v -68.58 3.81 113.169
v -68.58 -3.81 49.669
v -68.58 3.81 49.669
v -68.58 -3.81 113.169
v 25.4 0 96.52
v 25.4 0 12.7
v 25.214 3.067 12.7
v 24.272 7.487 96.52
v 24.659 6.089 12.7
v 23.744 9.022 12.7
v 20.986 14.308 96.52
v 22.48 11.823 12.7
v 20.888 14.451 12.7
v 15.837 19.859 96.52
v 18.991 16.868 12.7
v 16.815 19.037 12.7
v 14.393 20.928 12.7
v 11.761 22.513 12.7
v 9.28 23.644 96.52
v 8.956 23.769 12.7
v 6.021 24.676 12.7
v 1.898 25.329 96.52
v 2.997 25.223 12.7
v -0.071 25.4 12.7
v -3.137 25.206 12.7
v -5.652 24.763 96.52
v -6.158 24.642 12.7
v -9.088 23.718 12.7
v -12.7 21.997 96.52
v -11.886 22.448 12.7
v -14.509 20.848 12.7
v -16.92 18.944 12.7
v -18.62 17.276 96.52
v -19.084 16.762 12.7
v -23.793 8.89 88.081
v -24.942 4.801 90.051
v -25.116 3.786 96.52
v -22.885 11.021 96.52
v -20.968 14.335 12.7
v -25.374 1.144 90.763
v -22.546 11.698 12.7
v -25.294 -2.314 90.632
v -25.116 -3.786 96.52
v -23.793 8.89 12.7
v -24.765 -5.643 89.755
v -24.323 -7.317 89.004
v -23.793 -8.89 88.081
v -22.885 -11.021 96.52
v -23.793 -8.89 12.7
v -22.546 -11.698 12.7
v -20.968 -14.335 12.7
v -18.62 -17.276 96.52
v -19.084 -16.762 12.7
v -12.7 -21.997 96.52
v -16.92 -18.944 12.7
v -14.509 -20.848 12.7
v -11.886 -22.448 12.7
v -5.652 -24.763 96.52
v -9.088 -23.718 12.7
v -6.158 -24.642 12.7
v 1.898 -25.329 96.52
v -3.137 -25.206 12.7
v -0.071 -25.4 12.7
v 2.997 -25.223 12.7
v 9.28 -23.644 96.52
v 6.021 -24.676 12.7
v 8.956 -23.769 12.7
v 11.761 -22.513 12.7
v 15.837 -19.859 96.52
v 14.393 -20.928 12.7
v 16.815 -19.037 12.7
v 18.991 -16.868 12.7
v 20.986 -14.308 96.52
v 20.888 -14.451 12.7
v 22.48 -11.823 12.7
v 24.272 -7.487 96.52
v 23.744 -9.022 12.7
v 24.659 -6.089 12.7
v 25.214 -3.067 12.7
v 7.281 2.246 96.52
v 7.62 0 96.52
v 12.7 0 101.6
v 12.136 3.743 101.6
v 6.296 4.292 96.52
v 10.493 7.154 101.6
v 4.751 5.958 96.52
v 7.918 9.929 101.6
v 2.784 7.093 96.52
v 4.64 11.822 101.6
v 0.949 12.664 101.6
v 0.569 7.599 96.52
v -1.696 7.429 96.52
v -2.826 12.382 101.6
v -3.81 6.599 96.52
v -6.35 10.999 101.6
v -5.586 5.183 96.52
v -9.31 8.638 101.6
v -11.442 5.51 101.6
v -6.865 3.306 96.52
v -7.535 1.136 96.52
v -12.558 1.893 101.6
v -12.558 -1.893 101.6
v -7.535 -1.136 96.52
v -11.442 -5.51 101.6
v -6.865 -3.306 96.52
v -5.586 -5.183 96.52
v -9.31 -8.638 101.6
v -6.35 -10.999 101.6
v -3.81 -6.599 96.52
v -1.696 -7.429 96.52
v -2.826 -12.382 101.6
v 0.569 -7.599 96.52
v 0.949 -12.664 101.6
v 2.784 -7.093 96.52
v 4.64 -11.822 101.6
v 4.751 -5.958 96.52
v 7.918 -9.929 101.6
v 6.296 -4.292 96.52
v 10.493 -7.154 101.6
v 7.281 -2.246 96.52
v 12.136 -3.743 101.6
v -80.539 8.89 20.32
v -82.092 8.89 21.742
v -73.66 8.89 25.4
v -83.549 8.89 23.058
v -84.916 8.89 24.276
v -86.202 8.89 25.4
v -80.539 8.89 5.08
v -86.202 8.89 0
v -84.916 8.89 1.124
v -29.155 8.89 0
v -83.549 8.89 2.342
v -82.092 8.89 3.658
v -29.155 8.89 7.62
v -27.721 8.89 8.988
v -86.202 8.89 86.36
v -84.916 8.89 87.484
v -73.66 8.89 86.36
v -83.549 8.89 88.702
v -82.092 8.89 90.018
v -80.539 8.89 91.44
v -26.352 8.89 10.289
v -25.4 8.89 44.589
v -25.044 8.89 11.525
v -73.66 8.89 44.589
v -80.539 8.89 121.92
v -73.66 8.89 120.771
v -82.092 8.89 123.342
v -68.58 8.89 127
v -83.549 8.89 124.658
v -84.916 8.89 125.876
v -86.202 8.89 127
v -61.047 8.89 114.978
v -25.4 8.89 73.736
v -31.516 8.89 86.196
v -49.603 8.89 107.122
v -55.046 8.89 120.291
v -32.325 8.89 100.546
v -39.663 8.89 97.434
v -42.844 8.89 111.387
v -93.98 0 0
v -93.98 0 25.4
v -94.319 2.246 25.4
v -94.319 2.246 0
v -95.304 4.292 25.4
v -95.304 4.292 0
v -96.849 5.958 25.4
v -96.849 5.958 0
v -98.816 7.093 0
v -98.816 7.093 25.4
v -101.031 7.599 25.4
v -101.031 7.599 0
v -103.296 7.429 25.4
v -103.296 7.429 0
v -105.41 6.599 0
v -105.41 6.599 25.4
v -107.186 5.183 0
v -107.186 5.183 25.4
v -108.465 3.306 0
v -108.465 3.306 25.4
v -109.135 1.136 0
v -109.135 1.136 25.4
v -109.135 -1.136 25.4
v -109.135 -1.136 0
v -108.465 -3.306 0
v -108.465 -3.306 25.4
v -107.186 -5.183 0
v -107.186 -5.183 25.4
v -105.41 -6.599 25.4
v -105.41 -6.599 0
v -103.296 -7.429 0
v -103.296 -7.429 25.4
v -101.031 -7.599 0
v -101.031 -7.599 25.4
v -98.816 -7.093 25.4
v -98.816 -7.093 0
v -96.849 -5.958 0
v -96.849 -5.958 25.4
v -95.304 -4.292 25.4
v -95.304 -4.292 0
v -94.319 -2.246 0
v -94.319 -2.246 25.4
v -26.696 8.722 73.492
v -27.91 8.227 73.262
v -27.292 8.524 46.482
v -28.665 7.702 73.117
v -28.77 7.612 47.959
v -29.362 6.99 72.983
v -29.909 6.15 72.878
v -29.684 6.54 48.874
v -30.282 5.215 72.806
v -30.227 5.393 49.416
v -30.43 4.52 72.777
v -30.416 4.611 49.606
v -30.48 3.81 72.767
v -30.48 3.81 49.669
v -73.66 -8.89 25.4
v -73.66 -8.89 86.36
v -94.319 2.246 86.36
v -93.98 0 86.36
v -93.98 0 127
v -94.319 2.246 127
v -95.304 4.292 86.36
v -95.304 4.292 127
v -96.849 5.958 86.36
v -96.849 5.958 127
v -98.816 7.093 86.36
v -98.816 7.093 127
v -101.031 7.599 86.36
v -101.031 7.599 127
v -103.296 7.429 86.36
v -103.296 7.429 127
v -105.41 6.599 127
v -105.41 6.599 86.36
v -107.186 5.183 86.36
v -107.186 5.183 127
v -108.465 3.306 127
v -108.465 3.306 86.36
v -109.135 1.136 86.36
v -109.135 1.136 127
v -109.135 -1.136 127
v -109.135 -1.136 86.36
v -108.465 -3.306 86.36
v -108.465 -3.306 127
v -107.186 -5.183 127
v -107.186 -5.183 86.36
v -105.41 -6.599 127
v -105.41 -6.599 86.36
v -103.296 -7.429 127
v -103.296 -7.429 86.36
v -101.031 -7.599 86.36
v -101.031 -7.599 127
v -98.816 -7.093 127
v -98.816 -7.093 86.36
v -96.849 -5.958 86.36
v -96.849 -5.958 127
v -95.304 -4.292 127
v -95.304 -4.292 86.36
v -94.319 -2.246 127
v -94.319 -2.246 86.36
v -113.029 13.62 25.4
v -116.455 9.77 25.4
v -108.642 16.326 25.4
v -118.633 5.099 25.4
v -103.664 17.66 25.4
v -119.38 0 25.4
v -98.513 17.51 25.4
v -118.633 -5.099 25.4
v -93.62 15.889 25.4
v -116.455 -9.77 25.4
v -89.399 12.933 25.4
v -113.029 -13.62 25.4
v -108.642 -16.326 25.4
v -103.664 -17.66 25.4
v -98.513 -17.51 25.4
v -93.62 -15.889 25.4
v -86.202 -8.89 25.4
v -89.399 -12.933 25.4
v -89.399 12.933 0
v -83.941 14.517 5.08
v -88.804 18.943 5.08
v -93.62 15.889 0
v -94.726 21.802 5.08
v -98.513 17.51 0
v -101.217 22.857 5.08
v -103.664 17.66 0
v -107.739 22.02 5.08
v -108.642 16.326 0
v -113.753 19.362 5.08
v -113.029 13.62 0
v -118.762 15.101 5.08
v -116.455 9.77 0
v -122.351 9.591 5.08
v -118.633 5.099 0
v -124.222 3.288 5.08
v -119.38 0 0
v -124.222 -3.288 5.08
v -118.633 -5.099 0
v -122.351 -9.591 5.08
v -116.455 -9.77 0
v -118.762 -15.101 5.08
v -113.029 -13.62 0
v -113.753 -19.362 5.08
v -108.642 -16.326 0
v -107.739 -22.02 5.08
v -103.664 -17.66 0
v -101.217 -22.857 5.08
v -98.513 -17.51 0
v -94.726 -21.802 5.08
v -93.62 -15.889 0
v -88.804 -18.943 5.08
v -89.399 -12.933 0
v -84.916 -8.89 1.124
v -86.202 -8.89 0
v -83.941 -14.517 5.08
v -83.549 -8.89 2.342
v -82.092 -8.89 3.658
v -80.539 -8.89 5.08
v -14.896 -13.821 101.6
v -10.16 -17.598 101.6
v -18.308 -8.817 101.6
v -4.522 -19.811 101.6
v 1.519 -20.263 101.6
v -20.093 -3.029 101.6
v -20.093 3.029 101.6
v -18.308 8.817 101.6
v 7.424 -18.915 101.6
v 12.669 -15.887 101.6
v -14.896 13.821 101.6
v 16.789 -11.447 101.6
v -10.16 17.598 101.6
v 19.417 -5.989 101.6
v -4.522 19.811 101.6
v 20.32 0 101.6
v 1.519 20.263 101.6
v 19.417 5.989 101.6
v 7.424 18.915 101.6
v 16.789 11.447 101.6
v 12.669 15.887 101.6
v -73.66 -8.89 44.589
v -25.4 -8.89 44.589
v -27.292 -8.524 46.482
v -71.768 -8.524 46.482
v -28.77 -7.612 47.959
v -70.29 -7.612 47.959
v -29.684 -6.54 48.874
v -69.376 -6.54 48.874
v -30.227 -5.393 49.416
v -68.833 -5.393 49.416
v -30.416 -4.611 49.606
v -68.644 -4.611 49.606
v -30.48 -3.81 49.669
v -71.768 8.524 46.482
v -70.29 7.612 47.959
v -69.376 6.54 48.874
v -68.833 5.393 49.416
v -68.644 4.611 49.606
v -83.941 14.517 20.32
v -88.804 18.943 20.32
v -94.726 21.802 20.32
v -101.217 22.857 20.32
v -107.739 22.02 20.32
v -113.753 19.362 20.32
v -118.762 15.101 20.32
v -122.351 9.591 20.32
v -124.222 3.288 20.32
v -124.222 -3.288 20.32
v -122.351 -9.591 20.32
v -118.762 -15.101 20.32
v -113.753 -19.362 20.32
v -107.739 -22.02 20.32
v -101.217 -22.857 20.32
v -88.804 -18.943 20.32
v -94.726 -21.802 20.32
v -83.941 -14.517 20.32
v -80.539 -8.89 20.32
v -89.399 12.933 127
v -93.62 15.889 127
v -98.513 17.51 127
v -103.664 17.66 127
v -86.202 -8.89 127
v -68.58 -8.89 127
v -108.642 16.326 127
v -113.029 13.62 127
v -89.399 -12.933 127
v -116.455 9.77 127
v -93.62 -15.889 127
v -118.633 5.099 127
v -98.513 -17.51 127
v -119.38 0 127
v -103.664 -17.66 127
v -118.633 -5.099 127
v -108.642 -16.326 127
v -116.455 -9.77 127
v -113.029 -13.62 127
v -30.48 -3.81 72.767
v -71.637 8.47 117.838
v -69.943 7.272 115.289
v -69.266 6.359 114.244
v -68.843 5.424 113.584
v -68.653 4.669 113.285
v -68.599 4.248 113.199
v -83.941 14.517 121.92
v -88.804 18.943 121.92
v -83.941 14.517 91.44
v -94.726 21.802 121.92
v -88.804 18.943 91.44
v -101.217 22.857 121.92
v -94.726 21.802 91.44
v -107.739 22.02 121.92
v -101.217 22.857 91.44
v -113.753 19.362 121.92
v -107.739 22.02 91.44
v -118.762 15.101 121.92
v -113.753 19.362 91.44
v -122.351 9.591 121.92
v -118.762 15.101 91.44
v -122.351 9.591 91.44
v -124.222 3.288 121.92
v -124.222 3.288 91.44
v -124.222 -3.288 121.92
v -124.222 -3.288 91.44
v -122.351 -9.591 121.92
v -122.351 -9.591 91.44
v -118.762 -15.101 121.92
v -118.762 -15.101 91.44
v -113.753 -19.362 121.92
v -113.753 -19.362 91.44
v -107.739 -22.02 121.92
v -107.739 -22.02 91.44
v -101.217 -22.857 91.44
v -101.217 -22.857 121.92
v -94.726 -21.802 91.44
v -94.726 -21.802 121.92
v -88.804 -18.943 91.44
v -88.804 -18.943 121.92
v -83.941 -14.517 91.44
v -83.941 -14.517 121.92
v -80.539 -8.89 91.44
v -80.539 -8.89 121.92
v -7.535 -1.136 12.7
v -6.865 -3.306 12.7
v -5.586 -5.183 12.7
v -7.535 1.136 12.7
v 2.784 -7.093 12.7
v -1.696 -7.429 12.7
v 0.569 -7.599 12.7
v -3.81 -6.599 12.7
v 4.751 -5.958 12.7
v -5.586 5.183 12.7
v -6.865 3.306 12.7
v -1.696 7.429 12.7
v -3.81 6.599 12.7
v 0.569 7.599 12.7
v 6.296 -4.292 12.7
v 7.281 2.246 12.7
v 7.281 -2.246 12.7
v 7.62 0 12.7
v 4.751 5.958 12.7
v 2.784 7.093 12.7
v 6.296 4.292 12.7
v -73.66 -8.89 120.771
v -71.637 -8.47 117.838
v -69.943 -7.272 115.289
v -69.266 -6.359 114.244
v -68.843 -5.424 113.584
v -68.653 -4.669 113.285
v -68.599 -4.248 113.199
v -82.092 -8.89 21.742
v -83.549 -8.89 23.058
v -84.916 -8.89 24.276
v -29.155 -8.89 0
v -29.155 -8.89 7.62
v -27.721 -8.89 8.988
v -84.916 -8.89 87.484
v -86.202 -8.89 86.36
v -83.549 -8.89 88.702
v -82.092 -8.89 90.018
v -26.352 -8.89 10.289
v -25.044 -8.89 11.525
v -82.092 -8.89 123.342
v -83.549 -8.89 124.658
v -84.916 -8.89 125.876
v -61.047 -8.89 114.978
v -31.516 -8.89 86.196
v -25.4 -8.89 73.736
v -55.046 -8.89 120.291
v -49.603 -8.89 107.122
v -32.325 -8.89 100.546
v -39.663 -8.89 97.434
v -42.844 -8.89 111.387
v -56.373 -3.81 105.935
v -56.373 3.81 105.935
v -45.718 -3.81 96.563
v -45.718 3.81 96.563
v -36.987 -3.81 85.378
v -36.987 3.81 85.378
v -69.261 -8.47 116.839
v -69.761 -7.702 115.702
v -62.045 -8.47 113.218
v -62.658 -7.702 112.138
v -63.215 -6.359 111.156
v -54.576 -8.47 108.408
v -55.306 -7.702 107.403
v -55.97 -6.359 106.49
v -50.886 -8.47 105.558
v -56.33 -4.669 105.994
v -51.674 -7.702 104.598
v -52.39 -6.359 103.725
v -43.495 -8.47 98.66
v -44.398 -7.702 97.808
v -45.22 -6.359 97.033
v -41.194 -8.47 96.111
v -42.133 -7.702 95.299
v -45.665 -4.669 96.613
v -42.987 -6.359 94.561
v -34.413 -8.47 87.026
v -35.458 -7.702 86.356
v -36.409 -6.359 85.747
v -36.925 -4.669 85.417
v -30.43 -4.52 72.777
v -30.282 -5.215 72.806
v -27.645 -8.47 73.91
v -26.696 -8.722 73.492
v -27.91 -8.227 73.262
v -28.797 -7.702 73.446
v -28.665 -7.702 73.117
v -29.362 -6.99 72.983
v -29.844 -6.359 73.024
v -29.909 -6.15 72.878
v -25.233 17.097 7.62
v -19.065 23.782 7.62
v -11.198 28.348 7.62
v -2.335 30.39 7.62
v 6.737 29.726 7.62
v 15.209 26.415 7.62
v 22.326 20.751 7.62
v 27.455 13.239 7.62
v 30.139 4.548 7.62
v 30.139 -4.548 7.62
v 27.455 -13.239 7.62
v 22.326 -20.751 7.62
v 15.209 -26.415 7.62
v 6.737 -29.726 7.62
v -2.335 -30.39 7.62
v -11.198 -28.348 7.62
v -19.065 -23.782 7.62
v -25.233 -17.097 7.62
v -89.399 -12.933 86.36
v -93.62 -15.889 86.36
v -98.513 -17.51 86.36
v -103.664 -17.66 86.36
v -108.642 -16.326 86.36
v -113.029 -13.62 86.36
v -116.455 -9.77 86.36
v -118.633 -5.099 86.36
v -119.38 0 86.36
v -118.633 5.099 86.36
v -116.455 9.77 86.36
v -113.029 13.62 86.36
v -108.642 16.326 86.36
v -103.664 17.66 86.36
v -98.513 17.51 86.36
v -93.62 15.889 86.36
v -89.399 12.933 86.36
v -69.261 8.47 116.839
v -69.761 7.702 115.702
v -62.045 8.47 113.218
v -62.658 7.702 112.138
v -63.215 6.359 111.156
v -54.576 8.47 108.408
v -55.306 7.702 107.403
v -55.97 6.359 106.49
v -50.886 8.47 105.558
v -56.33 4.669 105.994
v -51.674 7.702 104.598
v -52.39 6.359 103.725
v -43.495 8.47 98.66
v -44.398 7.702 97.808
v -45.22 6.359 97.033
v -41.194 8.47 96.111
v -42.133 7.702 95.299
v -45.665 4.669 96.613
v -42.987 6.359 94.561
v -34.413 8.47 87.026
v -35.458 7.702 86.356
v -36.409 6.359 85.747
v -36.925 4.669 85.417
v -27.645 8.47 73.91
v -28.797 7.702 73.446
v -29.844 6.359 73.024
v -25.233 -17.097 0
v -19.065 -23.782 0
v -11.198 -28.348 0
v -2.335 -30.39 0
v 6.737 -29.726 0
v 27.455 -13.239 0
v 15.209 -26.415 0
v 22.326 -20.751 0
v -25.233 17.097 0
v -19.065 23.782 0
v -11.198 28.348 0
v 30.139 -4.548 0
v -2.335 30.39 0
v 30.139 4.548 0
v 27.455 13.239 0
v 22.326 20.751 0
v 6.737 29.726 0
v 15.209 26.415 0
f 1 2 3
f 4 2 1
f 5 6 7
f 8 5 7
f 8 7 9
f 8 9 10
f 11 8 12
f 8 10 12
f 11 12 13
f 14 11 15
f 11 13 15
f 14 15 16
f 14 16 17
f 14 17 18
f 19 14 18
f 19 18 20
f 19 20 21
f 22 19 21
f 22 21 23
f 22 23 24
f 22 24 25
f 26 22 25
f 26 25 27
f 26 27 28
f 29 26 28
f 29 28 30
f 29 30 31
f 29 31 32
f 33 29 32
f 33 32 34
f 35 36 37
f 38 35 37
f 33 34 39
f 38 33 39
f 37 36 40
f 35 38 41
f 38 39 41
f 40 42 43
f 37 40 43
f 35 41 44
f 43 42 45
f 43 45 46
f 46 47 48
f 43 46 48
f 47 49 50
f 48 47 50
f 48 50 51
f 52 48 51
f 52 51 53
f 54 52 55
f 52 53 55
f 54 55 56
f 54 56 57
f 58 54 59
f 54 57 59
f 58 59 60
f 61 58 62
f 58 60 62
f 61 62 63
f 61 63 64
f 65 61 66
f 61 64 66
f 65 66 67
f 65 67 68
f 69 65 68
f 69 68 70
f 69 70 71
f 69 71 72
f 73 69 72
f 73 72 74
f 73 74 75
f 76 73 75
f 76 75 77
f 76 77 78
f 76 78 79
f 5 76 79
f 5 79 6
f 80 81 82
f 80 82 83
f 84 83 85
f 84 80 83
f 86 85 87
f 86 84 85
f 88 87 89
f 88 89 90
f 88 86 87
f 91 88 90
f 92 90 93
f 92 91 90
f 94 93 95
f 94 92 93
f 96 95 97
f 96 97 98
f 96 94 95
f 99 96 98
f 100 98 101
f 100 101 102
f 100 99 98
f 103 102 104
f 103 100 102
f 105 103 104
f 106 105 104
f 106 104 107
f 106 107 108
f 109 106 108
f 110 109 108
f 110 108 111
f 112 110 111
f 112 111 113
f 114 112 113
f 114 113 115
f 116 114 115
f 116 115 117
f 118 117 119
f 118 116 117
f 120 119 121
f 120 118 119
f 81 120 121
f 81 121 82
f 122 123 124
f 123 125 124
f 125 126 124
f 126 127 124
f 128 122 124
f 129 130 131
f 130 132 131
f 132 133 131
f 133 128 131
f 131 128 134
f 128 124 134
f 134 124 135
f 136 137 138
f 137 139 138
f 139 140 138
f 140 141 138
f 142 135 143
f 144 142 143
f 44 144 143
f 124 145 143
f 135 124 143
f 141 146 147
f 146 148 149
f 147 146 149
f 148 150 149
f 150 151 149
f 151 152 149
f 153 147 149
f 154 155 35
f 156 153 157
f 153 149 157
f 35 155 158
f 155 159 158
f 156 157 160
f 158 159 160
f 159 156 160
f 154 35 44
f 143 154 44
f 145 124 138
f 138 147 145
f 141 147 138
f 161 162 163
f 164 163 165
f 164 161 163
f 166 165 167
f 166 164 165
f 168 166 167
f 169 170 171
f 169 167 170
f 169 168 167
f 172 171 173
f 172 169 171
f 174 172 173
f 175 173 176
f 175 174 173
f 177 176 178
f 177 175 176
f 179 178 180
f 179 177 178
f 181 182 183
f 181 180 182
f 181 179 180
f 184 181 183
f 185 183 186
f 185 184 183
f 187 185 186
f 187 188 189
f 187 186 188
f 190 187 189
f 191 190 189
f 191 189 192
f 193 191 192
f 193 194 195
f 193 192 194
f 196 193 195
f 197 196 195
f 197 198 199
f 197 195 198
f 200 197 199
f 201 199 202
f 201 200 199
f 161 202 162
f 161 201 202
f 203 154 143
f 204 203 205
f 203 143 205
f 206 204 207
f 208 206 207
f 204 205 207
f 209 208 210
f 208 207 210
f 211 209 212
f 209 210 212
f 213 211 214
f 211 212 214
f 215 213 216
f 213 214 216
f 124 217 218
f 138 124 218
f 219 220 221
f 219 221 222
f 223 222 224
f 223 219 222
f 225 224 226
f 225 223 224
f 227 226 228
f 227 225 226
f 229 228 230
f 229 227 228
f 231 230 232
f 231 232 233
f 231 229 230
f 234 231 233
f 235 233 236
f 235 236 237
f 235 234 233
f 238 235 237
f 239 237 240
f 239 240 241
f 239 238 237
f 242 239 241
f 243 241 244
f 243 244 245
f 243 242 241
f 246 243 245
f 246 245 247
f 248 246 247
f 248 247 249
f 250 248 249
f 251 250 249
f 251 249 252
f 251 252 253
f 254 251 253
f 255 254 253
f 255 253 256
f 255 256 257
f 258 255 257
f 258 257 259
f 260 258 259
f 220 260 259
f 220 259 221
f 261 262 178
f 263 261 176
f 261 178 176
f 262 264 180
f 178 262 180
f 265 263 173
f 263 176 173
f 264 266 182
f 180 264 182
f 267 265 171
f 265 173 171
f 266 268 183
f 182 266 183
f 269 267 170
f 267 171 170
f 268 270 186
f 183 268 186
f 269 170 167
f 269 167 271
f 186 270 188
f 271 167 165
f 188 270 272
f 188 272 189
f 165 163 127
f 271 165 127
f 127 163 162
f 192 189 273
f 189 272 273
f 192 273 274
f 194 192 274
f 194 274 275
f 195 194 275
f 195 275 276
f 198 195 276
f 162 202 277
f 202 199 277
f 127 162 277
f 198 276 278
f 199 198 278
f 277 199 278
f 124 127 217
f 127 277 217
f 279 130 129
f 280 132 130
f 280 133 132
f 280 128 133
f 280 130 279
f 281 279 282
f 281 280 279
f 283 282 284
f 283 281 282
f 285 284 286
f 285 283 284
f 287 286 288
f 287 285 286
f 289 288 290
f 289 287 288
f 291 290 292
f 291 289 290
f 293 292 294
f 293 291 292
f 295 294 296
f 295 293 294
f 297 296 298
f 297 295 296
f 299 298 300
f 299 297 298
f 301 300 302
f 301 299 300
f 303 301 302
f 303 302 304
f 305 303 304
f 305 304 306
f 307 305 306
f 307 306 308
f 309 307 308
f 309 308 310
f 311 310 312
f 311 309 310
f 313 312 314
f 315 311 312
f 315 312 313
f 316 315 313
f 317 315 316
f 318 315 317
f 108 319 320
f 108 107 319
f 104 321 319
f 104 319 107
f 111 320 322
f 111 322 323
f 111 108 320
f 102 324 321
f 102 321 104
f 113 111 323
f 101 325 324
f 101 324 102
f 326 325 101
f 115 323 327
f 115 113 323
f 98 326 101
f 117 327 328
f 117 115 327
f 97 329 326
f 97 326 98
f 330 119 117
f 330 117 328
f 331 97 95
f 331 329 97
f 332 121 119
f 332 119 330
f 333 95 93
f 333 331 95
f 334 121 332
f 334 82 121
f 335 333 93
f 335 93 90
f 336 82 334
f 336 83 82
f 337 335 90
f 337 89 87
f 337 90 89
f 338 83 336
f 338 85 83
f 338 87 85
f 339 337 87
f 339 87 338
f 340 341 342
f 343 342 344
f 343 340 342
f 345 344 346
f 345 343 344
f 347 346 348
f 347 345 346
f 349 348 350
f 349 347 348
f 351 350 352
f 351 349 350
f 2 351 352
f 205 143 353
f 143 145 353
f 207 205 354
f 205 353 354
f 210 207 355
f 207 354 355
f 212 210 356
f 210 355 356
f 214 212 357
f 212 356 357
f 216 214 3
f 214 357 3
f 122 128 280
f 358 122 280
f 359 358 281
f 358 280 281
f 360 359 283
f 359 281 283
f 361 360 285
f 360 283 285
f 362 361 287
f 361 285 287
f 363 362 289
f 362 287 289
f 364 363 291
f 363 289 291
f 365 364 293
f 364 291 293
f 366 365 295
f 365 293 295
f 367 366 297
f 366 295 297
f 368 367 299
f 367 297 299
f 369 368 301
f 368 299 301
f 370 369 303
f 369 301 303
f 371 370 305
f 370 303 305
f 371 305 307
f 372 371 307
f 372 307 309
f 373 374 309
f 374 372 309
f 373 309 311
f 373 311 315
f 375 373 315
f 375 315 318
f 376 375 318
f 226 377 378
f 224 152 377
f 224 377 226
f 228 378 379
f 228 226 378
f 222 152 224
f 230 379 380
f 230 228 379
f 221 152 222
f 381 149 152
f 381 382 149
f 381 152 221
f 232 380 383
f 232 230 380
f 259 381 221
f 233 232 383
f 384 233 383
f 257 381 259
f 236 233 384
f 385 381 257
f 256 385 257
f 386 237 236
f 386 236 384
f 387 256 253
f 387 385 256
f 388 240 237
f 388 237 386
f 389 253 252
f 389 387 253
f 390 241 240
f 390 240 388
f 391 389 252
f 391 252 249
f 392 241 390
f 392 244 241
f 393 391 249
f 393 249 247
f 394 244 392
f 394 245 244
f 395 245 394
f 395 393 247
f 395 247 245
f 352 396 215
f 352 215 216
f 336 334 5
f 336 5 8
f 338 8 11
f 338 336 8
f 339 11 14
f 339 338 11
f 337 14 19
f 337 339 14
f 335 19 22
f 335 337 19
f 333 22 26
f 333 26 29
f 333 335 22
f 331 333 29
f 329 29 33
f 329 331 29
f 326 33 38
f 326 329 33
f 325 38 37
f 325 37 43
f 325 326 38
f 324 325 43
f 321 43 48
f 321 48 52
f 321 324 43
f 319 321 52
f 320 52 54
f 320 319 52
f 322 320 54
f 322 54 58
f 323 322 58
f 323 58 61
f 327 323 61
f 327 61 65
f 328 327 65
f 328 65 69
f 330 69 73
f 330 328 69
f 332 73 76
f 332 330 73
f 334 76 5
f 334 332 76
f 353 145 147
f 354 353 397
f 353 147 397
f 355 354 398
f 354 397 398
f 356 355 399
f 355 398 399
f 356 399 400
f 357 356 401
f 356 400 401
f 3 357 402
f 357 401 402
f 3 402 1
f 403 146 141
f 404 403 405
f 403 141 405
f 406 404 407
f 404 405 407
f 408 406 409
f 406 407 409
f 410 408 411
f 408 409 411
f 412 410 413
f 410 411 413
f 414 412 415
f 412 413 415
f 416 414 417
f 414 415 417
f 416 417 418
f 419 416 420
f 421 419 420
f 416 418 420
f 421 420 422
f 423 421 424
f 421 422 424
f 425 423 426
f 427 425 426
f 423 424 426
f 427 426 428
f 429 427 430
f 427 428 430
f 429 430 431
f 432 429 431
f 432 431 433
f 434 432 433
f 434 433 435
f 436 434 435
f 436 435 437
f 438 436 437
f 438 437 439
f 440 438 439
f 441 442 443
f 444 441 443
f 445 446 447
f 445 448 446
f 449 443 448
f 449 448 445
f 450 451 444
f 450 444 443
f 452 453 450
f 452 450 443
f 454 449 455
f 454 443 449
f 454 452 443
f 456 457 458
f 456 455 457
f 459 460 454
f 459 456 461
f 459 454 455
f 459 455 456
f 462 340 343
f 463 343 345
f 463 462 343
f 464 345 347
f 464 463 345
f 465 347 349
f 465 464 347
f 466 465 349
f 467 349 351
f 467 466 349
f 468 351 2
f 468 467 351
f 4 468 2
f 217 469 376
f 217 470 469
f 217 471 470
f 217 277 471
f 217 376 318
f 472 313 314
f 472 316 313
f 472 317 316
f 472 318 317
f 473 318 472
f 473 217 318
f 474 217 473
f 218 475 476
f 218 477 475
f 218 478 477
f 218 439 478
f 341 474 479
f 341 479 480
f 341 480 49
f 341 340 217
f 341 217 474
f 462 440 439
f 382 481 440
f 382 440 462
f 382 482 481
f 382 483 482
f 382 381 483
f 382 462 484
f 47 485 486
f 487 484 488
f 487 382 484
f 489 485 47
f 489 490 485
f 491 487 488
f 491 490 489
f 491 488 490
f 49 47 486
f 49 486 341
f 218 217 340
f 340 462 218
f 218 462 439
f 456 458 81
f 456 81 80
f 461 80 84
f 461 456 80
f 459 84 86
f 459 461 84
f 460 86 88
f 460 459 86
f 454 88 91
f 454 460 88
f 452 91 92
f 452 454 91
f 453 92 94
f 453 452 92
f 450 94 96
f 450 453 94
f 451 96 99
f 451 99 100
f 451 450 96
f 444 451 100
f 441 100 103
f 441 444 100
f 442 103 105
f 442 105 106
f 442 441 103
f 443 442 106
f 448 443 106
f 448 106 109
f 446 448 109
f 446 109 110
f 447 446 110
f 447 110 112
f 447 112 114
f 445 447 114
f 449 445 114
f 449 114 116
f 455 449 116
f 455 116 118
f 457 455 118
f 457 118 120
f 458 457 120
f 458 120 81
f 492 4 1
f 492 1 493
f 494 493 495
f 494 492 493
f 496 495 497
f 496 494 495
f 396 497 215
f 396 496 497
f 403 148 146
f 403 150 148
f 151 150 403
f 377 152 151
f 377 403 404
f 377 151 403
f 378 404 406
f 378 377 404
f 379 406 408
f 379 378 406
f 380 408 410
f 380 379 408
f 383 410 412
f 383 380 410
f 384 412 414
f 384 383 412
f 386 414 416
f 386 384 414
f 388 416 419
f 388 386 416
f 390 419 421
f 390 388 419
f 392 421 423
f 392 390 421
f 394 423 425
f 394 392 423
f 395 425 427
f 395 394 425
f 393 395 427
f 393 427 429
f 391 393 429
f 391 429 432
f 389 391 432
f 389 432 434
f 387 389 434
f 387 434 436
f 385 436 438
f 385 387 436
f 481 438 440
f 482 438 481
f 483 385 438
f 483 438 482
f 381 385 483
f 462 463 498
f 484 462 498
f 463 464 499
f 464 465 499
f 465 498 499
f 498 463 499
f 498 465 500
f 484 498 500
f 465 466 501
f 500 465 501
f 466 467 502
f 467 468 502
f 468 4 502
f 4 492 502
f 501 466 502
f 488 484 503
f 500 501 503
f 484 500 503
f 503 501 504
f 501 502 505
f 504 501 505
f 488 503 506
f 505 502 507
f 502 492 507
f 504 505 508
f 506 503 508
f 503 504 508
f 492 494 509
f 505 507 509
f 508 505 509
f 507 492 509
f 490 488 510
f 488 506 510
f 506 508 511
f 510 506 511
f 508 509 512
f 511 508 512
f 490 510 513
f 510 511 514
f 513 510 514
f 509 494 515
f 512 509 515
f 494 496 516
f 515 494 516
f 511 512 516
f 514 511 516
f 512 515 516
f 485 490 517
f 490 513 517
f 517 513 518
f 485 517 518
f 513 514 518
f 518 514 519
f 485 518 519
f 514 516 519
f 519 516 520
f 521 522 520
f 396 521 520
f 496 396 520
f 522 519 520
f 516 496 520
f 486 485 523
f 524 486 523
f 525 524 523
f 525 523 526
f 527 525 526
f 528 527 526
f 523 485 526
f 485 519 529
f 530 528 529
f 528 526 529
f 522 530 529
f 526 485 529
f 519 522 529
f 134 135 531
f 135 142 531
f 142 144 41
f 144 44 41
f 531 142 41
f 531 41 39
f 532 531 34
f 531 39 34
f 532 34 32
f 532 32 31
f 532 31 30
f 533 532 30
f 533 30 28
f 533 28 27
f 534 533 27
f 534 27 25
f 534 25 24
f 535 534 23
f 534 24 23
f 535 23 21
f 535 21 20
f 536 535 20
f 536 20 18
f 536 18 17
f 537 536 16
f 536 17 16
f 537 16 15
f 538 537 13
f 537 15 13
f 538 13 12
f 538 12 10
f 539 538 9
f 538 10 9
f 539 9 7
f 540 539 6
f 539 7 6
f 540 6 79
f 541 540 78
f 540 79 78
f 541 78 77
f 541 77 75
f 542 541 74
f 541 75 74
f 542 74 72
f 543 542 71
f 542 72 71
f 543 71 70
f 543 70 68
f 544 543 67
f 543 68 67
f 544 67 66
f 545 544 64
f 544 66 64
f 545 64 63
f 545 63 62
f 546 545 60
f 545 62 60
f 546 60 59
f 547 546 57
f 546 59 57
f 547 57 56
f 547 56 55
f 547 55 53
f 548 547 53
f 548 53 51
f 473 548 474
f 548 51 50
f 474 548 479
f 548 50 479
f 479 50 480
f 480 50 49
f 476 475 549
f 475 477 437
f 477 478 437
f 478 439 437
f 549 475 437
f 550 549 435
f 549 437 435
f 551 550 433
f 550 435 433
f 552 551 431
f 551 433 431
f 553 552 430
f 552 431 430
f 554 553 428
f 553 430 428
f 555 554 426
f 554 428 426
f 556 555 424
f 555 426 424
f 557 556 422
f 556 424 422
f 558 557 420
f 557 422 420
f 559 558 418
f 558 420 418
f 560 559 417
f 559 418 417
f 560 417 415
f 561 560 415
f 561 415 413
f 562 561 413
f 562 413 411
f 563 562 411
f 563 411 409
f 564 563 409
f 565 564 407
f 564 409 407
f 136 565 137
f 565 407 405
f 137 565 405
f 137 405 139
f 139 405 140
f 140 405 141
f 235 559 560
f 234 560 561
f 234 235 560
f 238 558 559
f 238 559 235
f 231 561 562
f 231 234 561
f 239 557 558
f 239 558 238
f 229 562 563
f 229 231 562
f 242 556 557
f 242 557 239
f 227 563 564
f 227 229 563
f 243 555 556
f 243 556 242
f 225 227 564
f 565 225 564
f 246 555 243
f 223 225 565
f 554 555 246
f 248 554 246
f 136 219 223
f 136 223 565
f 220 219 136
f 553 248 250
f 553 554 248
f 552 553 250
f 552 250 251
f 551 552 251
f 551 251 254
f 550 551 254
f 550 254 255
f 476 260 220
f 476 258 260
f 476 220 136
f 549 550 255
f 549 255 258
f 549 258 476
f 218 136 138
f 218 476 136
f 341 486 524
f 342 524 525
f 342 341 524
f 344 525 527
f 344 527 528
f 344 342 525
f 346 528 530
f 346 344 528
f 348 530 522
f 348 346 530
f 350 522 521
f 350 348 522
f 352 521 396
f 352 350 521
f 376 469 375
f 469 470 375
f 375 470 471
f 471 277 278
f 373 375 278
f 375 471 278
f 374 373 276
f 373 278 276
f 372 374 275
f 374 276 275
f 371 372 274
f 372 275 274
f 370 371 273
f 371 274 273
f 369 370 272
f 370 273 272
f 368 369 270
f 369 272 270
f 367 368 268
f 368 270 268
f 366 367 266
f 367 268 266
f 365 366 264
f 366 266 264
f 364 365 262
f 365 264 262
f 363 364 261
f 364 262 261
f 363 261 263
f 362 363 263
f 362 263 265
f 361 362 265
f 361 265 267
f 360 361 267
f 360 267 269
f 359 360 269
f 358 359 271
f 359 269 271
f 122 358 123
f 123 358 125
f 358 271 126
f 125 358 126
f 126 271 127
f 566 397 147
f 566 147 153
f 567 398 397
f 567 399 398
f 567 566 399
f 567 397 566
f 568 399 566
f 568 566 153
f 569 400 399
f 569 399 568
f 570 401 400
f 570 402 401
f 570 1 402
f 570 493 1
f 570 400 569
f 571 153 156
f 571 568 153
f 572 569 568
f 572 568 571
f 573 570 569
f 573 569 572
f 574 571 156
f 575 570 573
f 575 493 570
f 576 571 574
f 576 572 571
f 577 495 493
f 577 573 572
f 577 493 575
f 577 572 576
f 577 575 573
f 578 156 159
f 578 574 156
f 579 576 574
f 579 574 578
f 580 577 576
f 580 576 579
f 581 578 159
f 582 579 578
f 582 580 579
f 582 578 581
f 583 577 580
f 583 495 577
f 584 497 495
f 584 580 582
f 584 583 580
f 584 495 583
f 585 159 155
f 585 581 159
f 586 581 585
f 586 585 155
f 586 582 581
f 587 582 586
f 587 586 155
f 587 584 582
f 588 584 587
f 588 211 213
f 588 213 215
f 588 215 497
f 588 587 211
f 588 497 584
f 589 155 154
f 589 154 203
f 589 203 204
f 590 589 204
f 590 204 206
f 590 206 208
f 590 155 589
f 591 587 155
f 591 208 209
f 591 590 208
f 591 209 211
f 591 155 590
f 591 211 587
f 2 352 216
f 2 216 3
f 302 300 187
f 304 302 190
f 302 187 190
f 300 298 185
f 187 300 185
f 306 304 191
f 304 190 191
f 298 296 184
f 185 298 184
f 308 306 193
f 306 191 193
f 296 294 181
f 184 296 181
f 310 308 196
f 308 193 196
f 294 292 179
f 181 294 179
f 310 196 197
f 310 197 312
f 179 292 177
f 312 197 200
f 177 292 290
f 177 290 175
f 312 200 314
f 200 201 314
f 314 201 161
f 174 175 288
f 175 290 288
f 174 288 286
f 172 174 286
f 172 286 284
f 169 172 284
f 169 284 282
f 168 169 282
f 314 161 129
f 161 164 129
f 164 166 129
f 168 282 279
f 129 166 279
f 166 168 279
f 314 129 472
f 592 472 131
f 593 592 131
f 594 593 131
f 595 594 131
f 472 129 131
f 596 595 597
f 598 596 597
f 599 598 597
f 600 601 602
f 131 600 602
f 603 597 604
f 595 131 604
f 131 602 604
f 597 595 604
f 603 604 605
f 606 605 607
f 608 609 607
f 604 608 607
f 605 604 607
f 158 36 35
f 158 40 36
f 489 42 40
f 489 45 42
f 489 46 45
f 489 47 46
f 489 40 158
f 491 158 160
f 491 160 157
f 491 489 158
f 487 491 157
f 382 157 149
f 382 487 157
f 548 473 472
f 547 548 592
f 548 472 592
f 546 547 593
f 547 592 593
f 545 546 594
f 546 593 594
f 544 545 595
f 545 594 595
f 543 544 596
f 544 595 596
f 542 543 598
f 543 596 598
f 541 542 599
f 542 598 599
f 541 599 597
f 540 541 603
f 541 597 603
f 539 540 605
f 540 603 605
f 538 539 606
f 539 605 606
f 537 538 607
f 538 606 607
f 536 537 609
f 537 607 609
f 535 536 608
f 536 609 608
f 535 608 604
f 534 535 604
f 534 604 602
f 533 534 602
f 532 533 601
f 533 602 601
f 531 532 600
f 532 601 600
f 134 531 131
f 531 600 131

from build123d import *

# Parameters (mm, degrees)
F0_R      = 22.86
F0_R_2    = 7.62
F1_DEPTH  = 127
F0_R_3    = 25.4
F2_DEPTH  = 101.6
F4_DEPTH  = 8.89
F5_W      = 60.96
F5_H      = 60.96
F6_DEPTH  = 50.8
F7_R      = 5.07999
F8_SIZE   = 5.08
F9_R      = 30.48
F10_DEPTH = 12.7
F11_SIZE  = 5.07999


# Not quite as in the source:
# - a fillet or chamfer is up to 0.001 mm smaller than in the source, because OpenCascade refuses the exact size


with BuildPart() as f1:
    # F0 (on Top) → F1 (new body)
    with BuildSketch(Plane.XY):
        with Locations((-101.6, 0)):
            Circle(F0_R)
        with Locations((-101.6, 0)):
            Circle(F0_R_2, mode=Mode.SUBTRACT)
    extrude(amount=F1_DEPTH)



with BuildPart() as f2:
    # F0 (on Top) → F2 (new body)
    with BuildSketch(Plane.XY):
        Circle(F0_R_3)
        Circle(F0_R_2, mode=Mode.SUBTRACT)
    extrude(amount=F2_DEPTH)


with BuildPart() as f1_1:
    add(f1.part)

    add(f2.part)  # F4 merges F2
    # F3 (on Front) → F4 (join, symmetric)
    with BuildSketch(Plane.XZ):
        with BuildLine():
            Line((-81.28, 127), (-81.28, 0))
            Line((-81.28, 0), (-20.32, 0))
            Line((-20.32, 0), (-20.32, 81.28))
            ThreePointArc((-20.32, 81.28), (-40.0155943211, 108.82076155), (-68.58, 127))
            Line((-68.58, 127), (-81.28, 127))
        make_face()
        with BuildLine():
            ThreePointArc((-68.58, 113.1692568198), (-45.7184650999, 96.5627163287), (-30.48, 72.7674195988))
            Line((-30.48, 72.7674195988), (-30.48, 49.6692568198))
            Line((-30.48, 49.6692568198), (-68.58, 49.6692568198))
            Line((-68.58, 49.6692568198), (-68.58, 113.1692568198))
        make_face(mode=Mode.SUBTRACT)
    extrude(amount=F4_DEPTH, both=True)

    # F5 (on Front) → F6 (cut, symmetric)
    with BuildSketch(Plane.XZ):
        with Locations((-104.14, 55.88)):
            Rectangle(F5_W, F5_H)
    extrude(amount=F6_DEPTH, both=True, mode=Mode.SUBTRACT)

    # F7 (radius 5.08 in the source; OpenCascade refuses exactly that, so slightly less here)
    f7_edges = [f1_1.edges().sort_by_distance(p)[0] for p in [
        (-45.718465, -8.89, 96.562716),
        (-30.48, -8.89, 61.218338),
        (-49.53, -8.89, 49.669257),
        (-68.58, -8.89, 81.419257),
        (-45.718465, 8.89, 96.562716),
        (-30.48, 8.89, 61.218338),
        (-49.53, 8.89, 49.669257),
        (-68.58, 8.89, 81.419257),
    ]]
    fillet(f7_edges, radius=F7_R)

    # F8
    f8_edges = [f1_1.edges().sort_by_distance(p)[0] for p in [
        (-124.46, 0, 86.36),
        (-124.46, 0, 0),
        (-124.46, 0, 25.4),
        (-124.46, 0, 127),
    ]]
    chamfer(f8_edges, length=F8_SIZE)

    # F9 (on Top) → F10 (join)
    with BuildSketch(Plane.XY):
        Circle(F9_R)
        with BuildLine():
            Line((-62.23, 2.54), (-62.23, -2.54))
            Line((-62.23, -2.54), (-31.6482369177, -2.54))
            ThreePointArc((-31.6482369177, -2.54), (-31.75, 0), (-31.6482369177, 2.54))
            Line((-31.6482369177, 2.54), (-62.23, 2.54))
        make_face()
    extrude(amount=F10_DEPTH)

    # F11 (size 5.08 in the source; OpenCascade refuses exactly that, so slightly less here)
    f11_edges = [f1_1.edges().sort_by_distance(p)[0] for p in [
        (30.48, 0, 12.7),
        (-25.4, 0, 101.6),
        (-7.62, 0, 101.6),
    ]]
    chamfer(f11_edges, length=F11_SIZE)


solid = f1_1.part
